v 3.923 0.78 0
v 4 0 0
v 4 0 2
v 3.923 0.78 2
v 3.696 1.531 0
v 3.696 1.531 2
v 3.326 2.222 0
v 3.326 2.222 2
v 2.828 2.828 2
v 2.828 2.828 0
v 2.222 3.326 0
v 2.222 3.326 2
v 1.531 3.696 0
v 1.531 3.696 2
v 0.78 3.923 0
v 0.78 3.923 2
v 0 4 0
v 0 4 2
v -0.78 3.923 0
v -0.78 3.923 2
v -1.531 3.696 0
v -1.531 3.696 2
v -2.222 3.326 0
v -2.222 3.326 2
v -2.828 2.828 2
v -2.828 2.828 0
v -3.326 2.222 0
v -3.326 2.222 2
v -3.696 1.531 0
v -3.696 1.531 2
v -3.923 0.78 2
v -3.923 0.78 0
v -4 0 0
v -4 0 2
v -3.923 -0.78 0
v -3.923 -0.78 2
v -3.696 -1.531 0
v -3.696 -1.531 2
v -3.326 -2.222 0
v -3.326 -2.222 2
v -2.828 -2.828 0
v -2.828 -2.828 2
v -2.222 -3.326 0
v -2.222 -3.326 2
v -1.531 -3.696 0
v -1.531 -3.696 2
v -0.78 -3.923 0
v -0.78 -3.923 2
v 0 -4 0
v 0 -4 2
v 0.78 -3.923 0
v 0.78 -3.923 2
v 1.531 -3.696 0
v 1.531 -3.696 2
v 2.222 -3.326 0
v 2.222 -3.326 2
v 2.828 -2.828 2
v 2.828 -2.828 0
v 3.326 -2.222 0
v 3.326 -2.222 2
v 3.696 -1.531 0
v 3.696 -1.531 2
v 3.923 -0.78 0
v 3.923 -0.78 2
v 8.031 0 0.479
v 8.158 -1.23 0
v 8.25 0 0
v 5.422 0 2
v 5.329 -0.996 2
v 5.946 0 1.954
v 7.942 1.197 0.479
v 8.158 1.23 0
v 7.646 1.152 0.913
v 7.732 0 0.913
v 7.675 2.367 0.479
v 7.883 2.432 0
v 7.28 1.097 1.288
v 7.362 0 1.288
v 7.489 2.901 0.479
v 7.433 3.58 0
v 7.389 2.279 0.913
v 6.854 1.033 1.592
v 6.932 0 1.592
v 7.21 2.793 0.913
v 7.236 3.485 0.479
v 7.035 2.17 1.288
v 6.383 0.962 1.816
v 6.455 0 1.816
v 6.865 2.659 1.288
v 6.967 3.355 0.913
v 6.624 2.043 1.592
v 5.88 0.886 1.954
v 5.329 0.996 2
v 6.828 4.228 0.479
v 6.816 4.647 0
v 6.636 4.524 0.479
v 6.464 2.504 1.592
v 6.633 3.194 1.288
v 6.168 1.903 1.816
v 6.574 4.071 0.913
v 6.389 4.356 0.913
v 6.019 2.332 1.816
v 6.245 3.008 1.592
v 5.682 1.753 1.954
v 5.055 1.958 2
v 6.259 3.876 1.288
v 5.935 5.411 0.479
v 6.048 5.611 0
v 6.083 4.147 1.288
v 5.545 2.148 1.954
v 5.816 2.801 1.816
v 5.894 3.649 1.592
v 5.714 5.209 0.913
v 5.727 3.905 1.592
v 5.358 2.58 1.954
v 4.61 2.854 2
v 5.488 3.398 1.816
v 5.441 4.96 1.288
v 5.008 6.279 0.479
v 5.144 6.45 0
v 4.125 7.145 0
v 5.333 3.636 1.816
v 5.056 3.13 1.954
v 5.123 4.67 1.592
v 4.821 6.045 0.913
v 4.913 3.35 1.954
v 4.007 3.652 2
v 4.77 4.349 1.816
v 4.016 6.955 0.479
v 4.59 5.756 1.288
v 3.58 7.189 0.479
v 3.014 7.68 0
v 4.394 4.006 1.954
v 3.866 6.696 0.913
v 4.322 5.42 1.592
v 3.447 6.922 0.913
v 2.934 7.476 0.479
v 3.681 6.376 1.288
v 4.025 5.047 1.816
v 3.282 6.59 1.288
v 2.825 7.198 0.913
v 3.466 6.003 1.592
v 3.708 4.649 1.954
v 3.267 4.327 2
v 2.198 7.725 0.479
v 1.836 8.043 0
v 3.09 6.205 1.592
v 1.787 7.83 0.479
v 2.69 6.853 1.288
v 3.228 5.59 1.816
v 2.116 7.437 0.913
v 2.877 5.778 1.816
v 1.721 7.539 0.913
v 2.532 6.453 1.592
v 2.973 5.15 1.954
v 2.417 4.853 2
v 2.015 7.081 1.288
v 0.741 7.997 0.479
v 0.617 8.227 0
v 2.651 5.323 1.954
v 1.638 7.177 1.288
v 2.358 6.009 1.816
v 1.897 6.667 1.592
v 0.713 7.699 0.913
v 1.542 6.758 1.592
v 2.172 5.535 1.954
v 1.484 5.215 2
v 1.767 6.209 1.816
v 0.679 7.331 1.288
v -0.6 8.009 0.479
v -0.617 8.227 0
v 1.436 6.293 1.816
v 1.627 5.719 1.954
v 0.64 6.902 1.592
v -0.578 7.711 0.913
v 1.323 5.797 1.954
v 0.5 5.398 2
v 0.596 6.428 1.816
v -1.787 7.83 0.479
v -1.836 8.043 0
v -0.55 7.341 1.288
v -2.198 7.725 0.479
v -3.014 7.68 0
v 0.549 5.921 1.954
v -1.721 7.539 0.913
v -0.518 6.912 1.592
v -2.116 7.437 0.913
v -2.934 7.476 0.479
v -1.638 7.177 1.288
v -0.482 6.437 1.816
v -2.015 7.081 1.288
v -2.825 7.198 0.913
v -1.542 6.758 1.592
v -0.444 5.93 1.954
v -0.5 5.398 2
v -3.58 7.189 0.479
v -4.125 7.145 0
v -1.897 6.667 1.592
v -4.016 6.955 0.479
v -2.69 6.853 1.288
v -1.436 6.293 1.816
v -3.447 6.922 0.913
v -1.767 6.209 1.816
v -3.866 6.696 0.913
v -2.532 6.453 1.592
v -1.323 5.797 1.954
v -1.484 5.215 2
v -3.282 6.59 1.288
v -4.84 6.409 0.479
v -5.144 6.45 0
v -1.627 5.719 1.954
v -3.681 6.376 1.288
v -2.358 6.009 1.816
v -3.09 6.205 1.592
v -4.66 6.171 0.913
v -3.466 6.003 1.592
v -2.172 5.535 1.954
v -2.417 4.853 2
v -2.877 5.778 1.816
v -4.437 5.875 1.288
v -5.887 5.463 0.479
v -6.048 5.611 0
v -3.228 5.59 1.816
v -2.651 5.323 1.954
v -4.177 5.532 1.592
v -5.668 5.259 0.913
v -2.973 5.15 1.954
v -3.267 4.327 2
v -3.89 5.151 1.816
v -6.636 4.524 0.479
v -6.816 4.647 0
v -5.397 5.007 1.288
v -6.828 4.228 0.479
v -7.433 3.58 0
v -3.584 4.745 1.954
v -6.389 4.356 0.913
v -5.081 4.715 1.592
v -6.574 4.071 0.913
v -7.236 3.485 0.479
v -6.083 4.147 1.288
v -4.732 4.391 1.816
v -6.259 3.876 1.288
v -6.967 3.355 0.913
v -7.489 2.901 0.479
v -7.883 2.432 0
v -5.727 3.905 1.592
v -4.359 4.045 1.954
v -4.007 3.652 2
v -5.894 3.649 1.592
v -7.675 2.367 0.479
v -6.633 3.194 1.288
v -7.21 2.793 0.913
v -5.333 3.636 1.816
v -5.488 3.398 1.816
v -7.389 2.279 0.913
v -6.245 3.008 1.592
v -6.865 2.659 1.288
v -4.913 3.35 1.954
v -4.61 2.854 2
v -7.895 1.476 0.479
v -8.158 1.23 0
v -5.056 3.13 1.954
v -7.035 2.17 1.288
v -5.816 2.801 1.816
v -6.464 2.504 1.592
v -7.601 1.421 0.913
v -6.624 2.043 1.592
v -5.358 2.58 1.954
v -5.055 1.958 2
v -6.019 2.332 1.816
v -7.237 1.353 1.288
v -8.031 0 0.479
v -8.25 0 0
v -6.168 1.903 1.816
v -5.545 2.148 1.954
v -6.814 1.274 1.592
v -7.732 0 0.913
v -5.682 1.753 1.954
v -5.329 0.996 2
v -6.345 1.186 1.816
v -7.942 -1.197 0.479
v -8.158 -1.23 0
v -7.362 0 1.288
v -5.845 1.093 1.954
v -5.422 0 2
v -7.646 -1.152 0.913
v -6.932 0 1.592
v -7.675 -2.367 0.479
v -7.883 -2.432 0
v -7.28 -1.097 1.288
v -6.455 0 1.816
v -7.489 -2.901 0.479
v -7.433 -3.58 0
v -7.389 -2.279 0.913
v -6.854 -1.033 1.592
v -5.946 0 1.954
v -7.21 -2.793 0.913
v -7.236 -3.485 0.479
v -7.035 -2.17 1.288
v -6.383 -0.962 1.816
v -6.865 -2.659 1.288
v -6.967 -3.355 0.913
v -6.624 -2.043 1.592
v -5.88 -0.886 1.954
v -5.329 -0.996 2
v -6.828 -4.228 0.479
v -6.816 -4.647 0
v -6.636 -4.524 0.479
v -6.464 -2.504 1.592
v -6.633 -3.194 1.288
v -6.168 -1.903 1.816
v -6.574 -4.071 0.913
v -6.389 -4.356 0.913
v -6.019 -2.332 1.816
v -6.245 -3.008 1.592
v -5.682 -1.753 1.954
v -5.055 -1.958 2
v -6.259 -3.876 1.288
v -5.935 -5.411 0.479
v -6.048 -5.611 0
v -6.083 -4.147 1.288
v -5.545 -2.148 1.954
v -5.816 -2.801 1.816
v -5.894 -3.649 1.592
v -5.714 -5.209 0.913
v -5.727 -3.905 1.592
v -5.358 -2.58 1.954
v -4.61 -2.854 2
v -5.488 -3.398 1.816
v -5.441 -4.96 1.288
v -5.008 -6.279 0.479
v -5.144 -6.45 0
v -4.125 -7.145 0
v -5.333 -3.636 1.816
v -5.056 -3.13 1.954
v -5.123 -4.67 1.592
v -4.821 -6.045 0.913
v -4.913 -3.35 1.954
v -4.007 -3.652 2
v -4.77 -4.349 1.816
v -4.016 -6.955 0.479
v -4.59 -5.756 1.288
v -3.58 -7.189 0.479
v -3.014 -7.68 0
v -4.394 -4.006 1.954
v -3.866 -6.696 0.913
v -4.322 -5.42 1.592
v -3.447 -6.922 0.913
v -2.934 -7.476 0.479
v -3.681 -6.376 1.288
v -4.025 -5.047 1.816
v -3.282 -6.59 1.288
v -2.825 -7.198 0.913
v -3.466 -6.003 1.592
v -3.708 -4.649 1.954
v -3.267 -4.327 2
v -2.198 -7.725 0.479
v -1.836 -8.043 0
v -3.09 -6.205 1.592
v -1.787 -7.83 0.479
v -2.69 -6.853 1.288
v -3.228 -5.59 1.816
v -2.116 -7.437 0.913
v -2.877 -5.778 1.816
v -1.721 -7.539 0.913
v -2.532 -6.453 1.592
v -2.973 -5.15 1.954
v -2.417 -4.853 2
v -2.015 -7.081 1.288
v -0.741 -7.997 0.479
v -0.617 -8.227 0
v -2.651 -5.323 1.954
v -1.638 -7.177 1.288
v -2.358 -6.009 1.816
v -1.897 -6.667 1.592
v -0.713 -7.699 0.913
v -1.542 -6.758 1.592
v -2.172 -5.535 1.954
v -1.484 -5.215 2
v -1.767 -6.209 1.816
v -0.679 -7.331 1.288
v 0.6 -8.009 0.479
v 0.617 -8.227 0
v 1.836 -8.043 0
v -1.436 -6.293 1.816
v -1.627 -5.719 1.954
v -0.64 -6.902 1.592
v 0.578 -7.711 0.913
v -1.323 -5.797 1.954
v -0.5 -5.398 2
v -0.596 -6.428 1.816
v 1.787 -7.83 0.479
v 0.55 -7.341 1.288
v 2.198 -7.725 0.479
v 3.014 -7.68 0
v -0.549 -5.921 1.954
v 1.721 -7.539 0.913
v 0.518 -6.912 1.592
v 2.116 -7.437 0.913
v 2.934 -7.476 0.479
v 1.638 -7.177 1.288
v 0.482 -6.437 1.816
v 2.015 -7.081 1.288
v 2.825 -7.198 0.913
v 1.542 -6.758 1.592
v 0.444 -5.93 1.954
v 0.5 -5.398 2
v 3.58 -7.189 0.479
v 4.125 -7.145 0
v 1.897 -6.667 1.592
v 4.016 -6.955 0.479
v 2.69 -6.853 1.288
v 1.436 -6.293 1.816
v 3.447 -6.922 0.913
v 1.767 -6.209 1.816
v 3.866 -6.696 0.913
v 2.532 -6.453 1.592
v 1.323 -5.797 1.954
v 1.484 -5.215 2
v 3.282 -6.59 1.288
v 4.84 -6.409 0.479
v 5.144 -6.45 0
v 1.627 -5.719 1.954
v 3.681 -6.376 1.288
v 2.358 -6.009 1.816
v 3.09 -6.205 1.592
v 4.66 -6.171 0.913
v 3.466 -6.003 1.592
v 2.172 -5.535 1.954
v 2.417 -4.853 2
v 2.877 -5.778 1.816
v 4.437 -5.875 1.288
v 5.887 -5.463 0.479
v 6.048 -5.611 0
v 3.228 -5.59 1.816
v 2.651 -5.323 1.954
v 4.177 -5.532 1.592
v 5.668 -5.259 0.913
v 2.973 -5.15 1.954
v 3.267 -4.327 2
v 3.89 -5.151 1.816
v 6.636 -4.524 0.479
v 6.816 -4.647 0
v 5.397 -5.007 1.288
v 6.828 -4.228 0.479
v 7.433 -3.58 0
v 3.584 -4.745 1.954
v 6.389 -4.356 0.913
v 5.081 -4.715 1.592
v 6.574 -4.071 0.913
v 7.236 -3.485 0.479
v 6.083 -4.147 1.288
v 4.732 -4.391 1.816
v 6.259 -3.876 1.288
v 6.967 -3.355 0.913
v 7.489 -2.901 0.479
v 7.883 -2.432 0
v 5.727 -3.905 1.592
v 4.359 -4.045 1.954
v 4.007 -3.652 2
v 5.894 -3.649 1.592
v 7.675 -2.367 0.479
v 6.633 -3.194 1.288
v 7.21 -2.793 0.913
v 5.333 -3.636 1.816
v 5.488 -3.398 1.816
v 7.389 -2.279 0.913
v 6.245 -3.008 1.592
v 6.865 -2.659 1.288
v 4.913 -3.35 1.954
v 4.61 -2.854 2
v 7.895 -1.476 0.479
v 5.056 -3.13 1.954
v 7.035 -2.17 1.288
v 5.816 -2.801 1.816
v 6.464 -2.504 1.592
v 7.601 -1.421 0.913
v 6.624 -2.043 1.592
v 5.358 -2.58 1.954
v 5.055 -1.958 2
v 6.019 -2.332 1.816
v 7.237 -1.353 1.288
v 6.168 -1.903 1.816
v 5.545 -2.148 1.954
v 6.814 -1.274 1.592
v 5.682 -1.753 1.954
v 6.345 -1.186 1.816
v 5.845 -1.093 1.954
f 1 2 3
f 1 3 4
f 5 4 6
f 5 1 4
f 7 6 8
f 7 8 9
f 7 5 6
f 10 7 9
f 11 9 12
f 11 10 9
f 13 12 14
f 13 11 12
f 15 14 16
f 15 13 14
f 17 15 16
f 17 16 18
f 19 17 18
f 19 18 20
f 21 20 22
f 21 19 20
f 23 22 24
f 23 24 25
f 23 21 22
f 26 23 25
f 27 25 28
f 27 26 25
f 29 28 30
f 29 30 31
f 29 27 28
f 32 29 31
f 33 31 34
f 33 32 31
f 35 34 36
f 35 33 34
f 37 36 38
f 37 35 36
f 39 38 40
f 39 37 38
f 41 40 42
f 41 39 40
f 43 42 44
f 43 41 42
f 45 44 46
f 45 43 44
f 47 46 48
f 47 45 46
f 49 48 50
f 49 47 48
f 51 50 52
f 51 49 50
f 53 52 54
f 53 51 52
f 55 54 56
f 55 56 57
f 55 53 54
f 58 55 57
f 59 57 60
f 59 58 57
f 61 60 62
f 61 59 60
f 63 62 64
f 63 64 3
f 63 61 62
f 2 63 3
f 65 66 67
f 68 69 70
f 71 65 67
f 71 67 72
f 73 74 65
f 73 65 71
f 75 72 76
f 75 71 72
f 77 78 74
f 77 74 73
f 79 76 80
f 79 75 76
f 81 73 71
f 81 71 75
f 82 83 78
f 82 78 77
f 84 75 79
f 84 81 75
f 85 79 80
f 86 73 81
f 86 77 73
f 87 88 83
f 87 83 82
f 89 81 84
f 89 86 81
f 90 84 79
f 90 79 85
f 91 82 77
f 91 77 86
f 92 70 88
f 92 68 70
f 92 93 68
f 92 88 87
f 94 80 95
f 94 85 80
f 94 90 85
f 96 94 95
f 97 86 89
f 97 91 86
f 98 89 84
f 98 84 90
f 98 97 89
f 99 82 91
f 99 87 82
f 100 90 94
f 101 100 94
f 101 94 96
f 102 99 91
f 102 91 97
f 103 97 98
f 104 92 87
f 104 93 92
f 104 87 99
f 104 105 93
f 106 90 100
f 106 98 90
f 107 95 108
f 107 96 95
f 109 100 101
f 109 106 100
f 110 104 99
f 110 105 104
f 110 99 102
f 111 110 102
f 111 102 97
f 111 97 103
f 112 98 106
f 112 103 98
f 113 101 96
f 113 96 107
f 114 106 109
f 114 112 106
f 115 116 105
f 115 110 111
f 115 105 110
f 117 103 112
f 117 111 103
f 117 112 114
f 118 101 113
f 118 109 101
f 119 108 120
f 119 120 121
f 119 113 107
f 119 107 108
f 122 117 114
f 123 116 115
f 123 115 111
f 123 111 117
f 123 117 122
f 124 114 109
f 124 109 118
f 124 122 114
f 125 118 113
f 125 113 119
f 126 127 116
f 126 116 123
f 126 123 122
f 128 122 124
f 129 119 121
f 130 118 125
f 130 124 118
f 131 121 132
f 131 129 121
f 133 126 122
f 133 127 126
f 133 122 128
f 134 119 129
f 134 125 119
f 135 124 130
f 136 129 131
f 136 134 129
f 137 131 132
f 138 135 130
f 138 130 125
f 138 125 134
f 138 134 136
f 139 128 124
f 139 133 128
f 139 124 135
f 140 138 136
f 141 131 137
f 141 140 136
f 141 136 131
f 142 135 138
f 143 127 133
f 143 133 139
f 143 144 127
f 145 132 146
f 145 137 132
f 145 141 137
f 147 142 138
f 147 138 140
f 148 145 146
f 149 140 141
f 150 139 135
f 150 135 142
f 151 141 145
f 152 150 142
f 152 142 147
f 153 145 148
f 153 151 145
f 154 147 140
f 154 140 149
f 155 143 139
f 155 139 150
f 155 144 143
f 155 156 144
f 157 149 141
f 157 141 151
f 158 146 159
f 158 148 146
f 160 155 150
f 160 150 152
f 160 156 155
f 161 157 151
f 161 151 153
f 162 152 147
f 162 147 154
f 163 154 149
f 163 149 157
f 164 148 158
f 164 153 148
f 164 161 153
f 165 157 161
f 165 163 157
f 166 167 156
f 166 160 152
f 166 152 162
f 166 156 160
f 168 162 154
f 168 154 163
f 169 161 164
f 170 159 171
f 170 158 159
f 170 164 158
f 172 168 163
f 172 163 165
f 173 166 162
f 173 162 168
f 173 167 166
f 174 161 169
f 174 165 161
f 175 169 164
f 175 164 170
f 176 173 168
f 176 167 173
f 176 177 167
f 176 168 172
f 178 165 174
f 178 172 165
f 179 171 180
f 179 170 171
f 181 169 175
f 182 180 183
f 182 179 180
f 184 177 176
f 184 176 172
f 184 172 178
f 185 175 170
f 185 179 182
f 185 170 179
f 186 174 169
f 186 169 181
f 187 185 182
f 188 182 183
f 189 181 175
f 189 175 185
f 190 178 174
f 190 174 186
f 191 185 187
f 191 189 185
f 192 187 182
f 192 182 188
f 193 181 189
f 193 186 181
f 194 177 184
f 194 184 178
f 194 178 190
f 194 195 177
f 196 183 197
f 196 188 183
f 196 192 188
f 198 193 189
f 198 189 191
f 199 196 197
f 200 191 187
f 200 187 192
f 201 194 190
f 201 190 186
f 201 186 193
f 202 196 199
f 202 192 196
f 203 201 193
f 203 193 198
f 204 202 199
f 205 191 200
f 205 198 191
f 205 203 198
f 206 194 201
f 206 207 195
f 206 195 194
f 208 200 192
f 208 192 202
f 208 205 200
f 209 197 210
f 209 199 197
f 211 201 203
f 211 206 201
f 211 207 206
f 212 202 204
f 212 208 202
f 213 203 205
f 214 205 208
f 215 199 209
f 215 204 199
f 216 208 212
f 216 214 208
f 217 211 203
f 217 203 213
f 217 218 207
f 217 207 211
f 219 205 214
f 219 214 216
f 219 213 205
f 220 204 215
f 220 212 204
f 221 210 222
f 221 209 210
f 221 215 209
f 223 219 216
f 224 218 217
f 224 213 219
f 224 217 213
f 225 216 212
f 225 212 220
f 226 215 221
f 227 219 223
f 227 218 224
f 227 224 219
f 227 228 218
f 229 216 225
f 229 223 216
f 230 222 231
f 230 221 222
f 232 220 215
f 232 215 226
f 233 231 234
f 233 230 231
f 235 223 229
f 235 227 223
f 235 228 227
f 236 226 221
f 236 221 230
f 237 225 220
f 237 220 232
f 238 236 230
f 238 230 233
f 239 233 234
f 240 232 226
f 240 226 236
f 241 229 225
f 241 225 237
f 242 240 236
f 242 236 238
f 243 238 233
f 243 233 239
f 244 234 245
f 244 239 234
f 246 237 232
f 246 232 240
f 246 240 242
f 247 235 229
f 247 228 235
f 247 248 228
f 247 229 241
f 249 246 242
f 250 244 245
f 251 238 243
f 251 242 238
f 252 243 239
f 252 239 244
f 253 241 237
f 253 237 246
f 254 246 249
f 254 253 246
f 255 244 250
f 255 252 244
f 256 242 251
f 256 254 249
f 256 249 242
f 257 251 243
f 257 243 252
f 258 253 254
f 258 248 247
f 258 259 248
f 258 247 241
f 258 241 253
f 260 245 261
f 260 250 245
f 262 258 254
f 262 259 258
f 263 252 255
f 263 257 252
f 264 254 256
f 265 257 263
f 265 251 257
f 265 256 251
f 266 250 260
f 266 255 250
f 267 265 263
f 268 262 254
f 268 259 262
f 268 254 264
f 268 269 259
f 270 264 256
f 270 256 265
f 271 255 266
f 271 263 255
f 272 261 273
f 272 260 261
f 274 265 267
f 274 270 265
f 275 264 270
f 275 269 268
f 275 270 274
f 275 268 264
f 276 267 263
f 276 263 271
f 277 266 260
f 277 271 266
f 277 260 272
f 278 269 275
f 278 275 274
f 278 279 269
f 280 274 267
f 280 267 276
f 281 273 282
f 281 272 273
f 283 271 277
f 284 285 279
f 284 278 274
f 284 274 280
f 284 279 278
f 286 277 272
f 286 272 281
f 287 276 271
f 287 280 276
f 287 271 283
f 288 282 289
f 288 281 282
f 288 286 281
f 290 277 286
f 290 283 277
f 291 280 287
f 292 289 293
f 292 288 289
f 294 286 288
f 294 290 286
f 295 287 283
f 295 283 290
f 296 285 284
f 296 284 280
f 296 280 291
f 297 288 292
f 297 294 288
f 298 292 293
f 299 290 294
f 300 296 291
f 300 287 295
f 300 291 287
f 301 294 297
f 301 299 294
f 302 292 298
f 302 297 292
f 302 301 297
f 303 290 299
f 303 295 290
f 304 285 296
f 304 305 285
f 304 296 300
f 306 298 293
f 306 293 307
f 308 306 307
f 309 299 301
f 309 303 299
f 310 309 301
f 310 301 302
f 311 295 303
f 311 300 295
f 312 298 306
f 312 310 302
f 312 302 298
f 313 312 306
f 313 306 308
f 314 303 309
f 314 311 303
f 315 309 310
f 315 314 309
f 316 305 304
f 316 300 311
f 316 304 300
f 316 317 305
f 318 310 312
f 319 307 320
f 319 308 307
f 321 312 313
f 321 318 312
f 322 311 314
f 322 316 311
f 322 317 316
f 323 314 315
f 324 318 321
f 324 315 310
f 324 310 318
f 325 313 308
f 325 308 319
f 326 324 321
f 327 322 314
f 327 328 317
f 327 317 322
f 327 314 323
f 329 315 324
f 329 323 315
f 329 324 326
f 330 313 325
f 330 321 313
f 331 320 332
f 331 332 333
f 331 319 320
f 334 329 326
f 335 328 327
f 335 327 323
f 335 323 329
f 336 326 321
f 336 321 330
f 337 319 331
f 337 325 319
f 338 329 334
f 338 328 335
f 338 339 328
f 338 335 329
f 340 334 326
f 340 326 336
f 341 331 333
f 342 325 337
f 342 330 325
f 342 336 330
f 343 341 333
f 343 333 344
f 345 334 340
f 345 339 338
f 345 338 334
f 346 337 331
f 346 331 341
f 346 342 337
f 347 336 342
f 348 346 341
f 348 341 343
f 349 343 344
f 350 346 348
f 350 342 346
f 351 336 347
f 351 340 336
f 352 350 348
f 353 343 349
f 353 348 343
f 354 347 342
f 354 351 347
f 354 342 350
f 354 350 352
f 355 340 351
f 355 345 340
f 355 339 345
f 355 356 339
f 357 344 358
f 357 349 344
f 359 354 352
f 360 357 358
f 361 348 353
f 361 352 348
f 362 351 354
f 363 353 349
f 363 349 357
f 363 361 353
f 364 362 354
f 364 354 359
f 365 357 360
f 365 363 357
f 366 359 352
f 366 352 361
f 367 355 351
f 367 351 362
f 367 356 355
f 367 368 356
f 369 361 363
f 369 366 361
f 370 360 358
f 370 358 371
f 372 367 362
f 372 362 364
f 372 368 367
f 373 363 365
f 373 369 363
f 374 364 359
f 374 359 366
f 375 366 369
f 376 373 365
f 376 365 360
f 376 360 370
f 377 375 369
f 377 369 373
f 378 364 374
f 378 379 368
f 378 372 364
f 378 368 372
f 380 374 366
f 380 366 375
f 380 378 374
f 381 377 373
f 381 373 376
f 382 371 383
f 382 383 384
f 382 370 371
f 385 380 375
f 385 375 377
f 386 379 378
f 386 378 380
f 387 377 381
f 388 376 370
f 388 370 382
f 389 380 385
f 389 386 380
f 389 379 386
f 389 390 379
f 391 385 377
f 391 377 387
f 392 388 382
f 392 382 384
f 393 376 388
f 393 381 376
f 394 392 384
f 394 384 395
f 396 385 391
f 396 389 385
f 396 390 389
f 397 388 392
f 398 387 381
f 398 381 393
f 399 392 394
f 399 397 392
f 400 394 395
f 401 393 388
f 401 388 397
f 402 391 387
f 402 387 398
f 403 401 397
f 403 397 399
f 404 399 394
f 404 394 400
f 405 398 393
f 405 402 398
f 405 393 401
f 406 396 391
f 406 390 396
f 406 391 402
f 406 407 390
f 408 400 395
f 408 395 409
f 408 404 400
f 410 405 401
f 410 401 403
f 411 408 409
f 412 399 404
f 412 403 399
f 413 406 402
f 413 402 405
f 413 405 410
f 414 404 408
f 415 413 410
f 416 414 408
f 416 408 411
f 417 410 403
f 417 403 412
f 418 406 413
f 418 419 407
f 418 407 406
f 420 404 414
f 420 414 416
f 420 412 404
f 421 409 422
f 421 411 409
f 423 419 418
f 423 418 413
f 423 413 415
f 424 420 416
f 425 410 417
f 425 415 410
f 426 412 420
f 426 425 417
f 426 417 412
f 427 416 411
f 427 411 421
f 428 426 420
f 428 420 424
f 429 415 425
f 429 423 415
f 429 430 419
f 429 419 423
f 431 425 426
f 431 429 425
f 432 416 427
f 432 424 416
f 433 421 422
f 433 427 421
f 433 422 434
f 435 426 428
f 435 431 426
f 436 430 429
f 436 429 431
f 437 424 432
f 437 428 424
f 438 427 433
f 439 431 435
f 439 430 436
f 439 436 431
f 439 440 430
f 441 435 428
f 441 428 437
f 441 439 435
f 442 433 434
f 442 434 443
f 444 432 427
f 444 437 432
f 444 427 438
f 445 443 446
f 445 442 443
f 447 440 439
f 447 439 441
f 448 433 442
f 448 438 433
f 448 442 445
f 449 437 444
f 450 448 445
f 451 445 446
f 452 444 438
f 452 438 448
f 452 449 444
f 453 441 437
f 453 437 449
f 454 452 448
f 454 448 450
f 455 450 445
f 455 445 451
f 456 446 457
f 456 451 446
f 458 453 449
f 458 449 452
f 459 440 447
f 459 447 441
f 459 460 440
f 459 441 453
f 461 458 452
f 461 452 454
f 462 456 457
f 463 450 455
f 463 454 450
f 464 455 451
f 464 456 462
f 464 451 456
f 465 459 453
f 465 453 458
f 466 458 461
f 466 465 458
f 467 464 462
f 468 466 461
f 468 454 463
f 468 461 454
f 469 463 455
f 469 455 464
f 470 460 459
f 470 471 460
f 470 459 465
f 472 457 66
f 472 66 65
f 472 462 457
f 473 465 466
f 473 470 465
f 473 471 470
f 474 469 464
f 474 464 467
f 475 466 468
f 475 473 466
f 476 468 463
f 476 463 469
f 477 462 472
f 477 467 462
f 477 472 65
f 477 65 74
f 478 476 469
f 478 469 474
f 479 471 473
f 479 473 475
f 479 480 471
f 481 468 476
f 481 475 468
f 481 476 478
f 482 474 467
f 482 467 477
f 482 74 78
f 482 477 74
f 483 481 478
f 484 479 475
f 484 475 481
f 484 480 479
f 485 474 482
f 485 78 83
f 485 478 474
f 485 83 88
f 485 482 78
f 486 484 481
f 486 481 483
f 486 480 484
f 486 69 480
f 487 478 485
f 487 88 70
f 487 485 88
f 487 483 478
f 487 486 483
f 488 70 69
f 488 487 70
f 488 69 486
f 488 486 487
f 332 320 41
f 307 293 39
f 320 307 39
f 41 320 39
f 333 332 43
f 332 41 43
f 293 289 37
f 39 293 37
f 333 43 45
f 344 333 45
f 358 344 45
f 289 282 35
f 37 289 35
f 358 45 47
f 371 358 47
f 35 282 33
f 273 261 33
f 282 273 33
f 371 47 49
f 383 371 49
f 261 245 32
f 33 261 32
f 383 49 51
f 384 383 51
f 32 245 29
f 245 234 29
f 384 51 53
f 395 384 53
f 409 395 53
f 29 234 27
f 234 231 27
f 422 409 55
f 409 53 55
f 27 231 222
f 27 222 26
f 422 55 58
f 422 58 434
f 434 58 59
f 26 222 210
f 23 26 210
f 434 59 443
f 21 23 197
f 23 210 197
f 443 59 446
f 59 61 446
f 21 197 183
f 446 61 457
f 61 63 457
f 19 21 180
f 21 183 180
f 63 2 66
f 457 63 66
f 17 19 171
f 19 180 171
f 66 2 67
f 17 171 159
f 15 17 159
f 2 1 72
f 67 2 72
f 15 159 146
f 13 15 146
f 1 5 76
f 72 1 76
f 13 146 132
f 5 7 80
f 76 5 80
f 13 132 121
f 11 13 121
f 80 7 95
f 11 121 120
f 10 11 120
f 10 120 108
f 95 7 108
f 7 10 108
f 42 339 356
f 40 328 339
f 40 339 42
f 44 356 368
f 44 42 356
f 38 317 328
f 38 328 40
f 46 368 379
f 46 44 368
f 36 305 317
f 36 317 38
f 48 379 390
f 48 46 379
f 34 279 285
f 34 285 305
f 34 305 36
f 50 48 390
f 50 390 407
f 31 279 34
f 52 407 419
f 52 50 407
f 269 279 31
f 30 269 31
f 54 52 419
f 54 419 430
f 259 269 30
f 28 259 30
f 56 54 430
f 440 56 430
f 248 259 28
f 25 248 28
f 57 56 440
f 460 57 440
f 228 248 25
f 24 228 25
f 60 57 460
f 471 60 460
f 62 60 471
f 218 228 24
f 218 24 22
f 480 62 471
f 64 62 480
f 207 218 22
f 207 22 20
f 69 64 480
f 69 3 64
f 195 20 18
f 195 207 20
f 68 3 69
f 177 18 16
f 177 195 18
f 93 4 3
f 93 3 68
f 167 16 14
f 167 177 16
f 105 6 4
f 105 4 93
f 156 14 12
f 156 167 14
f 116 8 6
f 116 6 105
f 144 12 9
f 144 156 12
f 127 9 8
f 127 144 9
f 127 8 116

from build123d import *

# Parameters (mm, degrees)
F0_R     = 8.25
F0_R_2   = 4
F1_DEPTH = 2
F2_DEPTH = 2


# Not quite as in the source:
# - a fillet or chamfer that OpenCascade refuses, or shapes differently, is made with other operations: its cross-section is extruded or revolved along the edge and cut away or added


with BuildPart() as f1:
    # F0 (on Top) → F1 (new body)
    with BuildSketch(Plane.XY):
        Circle(F0_R)
        Circle(F0_R_2, mode=Mode.SUBTRACT)
        Circle(F0_R_2)
    extrude(amount=F1_DEPTH)

    # F0 (on Top) → F2 (cut, through all)
    with BuildSketch(Plane.XY):
        Circle(F0_R_2)
    extrude(amount=F2_DEPTH, mode=Mode.SUBTRACT)

    # F3: fillet of radius 3 on 1 edges, made by hand

    # F3_s1 → F3_t2 (revolve, cut)
    with BuildSketch(Plane.XZ):
        with BuildLine():
            ThreePointArc((8.25, 0), (7.1536236828, 1.4494897428), (5.4215728753, 2))
            Line((5.4215728753, 2), (8.25, 2))
            Line((8.25, 2), (8.25, 0))
        make_face()
    revolve(axis=Axis((0, 0, 2), (0, 0, 1)), mode=Mode.SUBTRACT)


solid = f1.part
